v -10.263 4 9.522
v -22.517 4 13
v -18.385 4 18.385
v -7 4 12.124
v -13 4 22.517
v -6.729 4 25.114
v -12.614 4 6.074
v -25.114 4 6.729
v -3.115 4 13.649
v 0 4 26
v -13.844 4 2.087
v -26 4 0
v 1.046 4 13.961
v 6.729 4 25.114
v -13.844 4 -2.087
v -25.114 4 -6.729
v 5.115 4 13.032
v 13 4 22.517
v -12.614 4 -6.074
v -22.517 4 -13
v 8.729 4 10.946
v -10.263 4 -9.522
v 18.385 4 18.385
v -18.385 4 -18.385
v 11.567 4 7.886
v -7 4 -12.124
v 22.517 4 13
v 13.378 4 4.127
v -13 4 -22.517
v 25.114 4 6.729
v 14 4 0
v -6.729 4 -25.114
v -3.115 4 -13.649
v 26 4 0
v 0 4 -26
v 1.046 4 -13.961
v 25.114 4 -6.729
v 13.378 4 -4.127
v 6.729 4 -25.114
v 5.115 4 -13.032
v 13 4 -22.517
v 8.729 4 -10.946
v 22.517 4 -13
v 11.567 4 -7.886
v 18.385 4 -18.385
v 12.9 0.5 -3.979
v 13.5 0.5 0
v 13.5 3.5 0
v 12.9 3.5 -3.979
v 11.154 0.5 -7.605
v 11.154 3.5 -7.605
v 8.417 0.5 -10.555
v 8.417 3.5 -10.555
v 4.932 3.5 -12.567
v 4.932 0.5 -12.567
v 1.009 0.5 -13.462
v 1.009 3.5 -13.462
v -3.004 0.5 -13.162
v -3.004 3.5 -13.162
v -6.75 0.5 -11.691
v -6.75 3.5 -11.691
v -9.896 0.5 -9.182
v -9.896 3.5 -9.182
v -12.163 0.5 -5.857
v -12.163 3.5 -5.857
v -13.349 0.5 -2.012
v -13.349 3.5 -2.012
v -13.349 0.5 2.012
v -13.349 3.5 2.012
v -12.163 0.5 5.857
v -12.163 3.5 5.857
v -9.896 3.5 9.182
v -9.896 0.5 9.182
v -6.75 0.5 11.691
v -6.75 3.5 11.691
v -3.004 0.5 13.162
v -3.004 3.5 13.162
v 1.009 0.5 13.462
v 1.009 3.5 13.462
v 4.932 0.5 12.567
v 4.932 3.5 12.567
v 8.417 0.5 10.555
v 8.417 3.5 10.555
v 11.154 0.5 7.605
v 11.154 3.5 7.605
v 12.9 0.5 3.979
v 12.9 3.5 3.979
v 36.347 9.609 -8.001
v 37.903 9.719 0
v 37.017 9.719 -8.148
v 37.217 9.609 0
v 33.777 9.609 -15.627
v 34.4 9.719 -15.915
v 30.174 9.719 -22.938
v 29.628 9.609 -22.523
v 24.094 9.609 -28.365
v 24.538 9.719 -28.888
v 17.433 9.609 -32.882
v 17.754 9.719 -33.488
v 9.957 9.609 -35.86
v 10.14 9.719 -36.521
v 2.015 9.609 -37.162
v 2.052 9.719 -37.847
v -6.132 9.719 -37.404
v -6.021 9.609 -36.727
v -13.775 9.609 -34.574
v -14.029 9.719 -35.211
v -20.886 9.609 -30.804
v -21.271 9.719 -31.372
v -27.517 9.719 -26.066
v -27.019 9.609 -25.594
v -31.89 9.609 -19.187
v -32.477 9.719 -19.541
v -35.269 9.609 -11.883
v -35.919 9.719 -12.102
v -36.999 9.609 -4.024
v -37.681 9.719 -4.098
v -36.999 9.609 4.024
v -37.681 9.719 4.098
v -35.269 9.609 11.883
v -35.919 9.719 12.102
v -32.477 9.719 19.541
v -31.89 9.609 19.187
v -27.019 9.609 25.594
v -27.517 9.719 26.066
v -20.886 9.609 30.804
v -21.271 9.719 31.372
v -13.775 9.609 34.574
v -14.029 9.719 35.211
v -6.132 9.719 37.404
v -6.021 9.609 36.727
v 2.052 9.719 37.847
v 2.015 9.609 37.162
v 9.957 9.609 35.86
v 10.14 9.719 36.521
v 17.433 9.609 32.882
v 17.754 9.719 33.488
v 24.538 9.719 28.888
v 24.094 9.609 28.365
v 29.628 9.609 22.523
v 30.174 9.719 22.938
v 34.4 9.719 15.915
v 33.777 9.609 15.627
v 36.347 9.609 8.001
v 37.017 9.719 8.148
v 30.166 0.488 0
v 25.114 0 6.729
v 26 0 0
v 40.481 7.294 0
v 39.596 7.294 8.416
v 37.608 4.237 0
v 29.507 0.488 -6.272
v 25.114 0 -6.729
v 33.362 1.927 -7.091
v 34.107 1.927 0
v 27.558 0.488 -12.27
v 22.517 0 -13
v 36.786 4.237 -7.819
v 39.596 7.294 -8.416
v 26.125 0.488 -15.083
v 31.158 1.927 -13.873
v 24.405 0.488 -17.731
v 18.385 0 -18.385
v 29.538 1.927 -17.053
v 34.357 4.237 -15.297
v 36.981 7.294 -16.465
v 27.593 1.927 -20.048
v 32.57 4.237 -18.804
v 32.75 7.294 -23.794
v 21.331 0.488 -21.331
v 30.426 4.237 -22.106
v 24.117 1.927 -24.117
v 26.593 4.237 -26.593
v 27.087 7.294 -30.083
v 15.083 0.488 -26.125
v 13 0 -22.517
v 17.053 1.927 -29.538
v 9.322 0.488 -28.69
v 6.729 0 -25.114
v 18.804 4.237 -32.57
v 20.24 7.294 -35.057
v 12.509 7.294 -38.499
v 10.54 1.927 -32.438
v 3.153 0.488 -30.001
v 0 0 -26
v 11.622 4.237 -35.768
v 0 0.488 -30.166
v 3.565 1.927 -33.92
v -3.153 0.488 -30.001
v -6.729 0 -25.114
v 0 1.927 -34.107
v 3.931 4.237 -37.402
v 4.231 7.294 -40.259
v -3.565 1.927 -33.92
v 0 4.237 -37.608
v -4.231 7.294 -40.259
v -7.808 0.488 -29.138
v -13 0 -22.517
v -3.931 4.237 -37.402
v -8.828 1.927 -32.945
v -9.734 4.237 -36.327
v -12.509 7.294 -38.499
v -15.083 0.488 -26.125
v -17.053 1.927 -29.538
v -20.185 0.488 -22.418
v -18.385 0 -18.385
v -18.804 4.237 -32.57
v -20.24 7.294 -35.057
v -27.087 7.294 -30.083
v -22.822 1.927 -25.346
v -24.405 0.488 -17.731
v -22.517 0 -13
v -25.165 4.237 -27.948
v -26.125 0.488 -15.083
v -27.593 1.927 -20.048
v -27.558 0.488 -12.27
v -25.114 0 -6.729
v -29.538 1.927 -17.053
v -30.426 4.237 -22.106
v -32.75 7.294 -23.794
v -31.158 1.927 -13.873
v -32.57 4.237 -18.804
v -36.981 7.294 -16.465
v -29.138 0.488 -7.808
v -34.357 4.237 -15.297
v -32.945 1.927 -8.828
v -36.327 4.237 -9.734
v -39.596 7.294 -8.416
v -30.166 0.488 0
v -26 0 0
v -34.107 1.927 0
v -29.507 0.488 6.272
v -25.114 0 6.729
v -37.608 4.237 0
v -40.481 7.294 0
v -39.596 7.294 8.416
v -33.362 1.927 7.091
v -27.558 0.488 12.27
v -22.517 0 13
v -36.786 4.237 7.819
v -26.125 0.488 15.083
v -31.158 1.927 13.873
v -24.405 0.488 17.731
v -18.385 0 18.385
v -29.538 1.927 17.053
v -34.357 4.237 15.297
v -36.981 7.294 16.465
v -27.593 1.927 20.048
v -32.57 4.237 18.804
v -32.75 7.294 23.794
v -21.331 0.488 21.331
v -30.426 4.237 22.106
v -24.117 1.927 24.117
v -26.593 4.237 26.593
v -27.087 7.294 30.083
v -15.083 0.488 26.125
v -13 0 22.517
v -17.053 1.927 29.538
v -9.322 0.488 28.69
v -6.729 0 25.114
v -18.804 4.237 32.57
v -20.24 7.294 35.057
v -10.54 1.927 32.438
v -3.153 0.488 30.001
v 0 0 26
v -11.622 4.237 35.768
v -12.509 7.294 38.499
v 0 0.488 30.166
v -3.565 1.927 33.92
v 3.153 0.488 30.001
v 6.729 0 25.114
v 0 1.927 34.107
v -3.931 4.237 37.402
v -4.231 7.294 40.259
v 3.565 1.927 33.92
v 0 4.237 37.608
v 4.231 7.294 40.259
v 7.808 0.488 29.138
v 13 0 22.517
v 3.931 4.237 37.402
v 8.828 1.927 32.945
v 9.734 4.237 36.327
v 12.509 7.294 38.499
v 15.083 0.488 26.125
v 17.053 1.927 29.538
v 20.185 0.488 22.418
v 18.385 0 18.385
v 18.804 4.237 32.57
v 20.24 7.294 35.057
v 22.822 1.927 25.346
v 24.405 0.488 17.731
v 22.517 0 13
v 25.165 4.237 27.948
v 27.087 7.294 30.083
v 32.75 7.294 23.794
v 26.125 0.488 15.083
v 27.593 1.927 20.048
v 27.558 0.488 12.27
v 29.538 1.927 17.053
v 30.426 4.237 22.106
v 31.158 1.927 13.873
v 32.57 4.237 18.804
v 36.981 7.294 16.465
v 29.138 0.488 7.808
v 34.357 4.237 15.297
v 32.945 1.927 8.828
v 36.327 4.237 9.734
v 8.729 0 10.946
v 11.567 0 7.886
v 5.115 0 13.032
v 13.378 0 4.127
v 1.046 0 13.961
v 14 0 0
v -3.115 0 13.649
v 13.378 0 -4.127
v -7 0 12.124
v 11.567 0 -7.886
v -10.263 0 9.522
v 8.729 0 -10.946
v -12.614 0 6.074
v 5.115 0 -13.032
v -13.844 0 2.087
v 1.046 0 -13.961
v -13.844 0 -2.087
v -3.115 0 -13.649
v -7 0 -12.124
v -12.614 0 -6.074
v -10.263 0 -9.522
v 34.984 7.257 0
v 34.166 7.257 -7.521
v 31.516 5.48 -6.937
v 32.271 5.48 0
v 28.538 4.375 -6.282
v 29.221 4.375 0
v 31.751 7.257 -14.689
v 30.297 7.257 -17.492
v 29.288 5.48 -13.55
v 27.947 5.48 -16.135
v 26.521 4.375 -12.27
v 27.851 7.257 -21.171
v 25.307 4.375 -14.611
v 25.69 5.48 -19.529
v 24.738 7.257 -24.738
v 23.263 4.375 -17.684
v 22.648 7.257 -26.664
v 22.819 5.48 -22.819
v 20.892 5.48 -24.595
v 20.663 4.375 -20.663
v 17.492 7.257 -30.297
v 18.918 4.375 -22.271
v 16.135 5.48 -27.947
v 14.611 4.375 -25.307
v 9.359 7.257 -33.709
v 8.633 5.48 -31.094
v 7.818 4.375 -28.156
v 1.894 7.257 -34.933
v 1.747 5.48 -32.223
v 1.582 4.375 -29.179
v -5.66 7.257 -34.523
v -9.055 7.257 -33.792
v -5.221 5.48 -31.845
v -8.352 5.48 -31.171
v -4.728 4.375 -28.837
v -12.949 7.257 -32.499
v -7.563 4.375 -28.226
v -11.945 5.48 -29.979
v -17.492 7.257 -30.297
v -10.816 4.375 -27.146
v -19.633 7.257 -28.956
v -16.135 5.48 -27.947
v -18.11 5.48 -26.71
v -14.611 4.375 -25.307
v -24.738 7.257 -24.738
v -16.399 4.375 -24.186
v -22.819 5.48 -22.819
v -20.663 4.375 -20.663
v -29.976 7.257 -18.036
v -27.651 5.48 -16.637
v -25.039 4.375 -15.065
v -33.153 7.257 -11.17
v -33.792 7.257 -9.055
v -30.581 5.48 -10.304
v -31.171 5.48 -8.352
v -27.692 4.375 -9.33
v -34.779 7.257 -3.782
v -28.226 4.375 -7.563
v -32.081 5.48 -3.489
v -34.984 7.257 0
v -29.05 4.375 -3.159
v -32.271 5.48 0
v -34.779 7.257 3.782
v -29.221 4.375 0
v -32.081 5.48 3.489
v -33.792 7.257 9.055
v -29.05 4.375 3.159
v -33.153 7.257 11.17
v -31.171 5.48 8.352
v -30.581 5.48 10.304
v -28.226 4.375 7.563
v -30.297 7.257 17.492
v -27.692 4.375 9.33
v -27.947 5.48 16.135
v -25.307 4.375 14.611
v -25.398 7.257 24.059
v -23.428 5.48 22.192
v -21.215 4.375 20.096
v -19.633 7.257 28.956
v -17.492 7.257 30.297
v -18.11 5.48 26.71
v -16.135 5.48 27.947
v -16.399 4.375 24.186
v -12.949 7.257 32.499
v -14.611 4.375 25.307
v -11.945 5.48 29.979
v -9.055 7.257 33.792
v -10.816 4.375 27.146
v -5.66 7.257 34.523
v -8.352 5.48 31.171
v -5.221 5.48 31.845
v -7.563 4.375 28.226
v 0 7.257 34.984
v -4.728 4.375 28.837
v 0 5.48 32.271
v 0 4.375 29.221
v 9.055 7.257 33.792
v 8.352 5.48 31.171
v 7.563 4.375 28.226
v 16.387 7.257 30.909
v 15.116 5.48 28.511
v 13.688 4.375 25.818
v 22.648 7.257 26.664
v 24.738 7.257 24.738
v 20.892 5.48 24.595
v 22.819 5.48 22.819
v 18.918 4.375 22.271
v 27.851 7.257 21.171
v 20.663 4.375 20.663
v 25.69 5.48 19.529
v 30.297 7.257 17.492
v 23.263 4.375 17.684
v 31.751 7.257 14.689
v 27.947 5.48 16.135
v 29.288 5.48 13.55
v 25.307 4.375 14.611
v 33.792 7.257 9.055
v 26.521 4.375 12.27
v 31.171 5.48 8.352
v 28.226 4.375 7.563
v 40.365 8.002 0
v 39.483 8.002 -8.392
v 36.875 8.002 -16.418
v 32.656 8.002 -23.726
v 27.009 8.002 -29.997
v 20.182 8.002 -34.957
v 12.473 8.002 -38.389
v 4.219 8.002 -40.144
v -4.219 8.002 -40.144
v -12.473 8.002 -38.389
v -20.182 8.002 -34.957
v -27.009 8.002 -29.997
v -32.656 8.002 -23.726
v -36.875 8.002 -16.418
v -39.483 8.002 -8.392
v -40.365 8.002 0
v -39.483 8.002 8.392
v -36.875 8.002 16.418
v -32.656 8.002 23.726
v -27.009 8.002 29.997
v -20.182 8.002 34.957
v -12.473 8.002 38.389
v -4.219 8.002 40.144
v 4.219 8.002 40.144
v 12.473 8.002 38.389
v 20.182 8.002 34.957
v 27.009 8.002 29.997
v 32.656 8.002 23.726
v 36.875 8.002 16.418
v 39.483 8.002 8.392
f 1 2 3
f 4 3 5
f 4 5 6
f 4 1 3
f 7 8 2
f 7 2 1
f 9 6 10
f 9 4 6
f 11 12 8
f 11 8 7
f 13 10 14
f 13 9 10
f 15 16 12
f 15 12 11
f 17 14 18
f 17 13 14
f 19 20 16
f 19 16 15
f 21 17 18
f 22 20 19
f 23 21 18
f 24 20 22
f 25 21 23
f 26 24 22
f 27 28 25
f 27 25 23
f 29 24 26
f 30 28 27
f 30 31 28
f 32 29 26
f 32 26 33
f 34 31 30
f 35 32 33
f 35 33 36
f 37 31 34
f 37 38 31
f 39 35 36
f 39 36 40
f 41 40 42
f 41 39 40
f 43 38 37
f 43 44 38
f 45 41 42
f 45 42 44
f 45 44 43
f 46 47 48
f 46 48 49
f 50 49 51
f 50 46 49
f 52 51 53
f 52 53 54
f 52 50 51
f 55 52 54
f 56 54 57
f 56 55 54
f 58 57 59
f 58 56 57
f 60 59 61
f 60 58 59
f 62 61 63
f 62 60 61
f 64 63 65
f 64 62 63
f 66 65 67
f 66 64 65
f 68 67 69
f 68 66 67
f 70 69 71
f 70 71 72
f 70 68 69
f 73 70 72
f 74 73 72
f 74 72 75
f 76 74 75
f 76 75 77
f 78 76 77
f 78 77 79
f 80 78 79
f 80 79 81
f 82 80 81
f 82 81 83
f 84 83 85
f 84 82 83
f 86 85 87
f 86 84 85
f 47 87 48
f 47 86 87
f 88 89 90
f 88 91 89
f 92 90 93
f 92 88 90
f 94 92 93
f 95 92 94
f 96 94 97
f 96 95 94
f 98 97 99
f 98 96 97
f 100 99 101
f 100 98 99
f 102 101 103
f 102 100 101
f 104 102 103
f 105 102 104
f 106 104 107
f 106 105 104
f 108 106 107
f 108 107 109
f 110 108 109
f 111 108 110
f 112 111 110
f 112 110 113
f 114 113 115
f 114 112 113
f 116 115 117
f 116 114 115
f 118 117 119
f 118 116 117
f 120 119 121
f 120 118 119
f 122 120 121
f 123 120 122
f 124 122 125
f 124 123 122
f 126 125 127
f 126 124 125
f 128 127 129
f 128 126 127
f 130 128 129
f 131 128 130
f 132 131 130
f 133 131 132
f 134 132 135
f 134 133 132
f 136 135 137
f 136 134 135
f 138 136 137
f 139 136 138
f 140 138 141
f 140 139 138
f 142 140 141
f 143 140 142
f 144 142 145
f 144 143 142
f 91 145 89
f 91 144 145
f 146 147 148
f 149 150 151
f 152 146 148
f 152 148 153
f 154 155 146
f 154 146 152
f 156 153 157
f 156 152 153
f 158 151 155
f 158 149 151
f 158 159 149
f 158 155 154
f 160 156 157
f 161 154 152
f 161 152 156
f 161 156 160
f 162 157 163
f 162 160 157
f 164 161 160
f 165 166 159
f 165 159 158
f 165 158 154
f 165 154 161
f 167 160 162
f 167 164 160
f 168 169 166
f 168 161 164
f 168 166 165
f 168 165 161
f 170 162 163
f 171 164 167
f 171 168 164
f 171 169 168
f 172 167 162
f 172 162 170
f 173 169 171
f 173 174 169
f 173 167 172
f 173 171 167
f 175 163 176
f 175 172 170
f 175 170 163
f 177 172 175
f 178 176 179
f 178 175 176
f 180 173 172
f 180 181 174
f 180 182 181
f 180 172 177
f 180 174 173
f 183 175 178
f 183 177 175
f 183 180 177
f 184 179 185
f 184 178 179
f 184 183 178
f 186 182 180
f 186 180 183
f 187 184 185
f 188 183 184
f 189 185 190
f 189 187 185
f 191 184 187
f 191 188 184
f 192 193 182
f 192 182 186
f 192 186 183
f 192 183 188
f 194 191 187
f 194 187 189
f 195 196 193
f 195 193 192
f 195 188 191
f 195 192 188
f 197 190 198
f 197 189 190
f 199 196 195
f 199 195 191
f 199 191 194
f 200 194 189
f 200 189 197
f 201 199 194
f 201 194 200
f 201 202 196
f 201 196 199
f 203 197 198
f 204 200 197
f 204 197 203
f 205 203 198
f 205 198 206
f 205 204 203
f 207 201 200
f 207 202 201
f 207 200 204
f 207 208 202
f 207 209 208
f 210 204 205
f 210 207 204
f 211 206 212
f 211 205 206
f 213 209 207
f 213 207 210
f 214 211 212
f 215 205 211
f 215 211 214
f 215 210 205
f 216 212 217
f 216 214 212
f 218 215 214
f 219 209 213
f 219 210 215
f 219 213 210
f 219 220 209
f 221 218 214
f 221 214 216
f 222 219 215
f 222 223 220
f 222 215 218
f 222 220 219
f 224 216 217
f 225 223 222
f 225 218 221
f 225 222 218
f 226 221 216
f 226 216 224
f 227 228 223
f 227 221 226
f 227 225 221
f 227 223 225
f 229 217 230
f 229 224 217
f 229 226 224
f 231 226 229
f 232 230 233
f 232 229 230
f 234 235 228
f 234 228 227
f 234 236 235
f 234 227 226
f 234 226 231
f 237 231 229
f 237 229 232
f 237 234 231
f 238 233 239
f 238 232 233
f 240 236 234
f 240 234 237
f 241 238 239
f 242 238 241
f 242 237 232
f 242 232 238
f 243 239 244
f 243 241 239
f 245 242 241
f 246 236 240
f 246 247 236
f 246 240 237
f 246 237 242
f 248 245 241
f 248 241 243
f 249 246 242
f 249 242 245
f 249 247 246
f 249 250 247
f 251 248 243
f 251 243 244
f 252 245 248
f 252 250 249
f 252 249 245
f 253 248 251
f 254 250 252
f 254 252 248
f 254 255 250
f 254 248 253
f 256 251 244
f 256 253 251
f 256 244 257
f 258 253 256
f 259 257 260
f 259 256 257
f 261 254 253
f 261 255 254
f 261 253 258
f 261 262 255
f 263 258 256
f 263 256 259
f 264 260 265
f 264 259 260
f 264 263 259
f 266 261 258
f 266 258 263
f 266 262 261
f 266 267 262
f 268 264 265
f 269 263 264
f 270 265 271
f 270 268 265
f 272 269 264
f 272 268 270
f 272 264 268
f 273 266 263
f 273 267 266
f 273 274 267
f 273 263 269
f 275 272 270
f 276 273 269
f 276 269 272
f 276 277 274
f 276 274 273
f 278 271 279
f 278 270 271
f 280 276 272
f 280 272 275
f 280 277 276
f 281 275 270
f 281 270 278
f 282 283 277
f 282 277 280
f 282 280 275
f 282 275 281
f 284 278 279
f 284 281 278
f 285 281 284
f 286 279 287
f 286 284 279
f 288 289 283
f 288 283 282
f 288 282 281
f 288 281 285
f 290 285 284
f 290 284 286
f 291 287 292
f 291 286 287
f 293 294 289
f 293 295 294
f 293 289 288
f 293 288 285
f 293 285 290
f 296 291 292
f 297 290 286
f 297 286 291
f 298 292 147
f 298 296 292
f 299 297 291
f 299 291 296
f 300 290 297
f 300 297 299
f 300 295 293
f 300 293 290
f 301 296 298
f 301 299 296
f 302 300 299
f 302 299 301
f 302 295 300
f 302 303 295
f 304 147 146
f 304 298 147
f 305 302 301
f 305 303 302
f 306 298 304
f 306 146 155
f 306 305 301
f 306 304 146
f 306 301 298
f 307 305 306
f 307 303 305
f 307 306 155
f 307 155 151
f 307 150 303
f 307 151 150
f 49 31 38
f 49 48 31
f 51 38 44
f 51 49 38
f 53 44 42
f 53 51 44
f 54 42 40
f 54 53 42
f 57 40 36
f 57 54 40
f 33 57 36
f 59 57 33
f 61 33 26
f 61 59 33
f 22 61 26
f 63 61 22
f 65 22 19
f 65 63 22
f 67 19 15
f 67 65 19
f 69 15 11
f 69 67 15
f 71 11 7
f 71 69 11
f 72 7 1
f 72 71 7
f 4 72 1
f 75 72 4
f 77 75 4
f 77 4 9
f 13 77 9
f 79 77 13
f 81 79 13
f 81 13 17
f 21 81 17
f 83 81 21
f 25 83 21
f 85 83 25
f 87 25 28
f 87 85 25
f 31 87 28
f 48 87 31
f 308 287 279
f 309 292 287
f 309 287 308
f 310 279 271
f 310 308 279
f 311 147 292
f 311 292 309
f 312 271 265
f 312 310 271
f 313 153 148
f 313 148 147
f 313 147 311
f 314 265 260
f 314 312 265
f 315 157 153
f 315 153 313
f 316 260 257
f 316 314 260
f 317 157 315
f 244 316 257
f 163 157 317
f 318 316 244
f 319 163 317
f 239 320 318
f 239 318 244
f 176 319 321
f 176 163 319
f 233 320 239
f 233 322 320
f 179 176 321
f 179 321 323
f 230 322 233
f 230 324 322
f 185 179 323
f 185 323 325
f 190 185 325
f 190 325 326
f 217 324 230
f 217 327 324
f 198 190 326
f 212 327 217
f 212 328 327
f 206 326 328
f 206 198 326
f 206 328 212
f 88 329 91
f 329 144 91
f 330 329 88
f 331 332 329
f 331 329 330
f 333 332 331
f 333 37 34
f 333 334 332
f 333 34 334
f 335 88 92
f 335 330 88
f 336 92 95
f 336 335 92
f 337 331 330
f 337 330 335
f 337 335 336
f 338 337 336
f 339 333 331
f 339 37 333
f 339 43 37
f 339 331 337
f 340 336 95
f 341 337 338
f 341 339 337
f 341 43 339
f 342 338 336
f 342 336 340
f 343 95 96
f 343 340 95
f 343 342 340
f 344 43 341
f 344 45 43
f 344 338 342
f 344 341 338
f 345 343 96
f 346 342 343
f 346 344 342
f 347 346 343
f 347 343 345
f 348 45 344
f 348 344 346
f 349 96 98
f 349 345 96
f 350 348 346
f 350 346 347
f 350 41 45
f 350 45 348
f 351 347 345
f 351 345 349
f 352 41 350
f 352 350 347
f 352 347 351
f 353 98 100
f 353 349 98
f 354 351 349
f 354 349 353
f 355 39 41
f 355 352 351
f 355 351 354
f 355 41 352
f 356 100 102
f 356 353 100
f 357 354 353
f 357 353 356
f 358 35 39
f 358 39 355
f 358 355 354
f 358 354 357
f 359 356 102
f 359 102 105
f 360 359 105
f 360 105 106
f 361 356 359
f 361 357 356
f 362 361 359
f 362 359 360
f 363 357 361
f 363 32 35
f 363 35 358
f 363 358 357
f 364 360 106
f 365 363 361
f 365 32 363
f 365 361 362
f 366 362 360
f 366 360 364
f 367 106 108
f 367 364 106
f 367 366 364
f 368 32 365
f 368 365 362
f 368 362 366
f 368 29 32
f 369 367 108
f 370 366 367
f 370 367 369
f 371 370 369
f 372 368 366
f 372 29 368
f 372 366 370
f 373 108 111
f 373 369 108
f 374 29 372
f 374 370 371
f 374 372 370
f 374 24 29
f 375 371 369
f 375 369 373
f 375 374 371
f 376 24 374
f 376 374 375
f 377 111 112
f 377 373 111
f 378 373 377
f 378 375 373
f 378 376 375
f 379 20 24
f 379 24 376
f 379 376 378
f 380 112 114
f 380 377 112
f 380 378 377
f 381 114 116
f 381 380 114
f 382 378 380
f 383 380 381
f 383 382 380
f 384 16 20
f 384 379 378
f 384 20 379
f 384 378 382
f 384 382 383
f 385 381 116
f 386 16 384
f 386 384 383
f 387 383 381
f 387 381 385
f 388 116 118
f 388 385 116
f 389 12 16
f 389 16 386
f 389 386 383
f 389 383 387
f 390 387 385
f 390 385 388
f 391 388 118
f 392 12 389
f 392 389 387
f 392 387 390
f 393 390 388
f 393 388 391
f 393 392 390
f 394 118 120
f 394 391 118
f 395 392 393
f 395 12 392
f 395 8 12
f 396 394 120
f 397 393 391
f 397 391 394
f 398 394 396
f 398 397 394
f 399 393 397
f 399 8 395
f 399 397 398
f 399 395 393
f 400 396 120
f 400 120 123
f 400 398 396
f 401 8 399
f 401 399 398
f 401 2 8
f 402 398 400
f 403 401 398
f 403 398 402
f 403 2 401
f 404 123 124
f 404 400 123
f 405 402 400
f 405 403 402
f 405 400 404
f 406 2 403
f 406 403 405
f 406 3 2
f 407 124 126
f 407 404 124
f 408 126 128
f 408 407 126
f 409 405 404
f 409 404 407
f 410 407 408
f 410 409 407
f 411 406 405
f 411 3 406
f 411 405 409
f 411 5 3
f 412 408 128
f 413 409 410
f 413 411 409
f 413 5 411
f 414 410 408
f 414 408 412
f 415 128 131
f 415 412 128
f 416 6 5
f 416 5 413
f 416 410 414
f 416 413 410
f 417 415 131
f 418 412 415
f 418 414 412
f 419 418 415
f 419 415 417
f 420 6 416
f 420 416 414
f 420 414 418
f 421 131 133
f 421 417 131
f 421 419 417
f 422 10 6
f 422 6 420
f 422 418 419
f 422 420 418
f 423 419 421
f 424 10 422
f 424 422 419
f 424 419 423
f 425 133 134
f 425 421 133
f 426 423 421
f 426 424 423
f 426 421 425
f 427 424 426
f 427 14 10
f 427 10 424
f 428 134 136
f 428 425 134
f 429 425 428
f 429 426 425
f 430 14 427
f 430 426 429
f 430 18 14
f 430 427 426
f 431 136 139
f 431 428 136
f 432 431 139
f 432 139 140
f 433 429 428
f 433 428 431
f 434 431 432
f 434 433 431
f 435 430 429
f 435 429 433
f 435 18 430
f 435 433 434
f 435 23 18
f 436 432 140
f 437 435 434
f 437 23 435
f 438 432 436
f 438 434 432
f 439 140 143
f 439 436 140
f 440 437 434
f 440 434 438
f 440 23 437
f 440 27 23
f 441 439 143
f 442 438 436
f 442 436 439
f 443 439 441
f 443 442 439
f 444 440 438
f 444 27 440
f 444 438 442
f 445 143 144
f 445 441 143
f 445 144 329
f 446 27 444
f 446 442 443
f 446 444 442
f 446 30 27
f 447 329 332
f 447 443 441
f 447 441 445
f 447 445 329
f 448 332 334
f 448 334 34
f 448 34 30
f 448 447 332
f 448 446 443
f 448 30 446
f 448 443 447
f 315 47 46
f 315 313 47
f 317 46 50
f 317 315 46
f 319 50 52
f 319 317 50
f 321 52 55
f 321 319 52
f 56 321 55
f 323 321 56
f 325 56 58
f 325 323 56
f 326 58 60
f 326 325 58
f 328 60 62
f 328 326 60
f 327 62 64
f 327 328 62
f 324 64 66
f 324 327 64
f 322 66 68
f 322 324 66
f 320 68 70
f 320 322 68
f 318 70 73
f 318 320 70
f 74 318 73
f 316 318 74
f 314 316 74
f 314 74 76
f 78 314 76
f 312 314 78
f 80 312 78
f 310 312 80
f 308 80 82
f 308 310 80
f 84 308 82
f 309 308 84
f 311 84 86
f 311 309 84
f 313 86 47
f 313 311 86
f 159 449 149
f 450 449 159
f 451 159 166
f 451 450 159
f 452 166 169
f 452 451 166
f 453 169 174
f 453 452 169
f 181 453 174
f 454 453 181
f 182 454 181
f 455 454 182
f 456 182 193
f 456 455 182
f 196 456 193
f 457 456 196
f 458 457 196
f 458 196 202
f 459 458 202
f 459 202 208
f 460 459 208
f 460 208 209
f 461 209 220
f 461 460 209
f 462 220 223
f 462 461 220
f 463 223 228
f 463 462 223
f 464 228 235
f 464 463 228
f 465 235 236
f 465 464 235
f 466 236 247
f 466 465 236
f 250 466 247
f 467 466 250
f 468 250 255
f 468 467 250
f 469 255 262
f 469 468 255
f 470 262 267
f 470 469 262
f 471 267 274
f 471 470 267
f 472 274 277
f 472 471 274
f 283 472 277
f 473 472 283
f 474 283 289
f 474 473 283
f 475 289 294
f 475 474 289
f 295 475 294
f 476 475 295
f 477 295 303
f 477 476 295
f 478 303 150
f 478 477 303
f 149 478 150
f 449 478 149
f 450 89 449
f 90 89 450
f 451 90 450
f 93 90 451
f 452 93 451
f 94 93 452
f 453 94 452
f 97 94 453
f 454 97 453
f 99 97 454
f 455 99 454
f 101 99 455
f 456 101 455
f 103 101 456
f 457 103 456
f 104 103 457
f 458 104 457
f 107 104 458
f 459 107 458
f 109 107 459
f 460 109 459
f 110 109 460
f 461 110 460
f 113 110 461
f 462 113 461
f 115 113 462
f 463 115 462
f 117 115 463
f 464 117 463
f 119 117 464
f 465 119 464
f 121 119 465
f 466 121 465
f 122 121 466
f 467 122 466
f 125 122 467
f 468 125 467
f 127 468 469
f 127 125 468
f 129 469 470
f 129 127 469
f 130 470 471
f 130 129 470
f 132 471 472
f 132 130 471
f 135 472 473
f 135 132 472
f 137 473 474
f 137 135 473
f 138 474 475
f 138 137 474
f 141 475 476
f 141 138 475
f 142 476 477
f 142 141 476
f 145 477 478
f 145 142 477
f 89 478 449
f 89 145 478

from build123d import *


# Not quite as in the source:
# - a fillet or chamfer that OpenCascade refuses, or shapes differently, is made with other operations: its cross-section is extruded or revolved along the edge and cut away or added


with BuildPart() as f1:
    # F0 (on Top) → F1 (revolve)
    with BuildSketch(Plane.XY):
        with BuildLine():
            Line((26, 4), (13.5, 4))
            Line((13.5, 4), (13.5, 0))
            Line((13.5, 0), (26, 0))
            ThreePointArc((26, 0), (34.3358249123, 2.0438355847), (40.7808320951, 7.7117384844))
            Line((40.7808320951, 7.7117384844), (37.5, 10))
            ThreePointArc((37.5, 10), (32.4855608855, 5.5901749694), (26, 4))
        make_face()
    revolve(axis=Axis((0, 5.3547318093, 0), (0, 1, 0)))

    # F2: chamfer of 0.5 on 5 edges, made by hand

    # F2_s1 → F2_t2 (revolve, cut)
    with BuildSketch(Plane.XY):
        Polygon((14, 4), (13.5, 3.5), (13.5, 4), align=None)
    revolve(axis=Axis((0, 4, 0), (0, 1, 0)), mode=Mode.SUBTRACT)

    # F2_s3 → F2_t4 (revolve, cut)
    with BuildSketch(Plane.XY):
        Polygon((13.5, 0.5), (14, 0), (13.5, 0), align=None)
    revolve(axis=Axis((0, 0, 0), (0, 1, 0)), mode=Mode.SUBTRACT)

    # F2_s5 → F2_t6 (revolve, cut)
    with BuildSketch(Plane.XY):
        with BuildLine():
            Line((37.9030413035, 9.7188932937), (37.2169968397, 9.608773582))
            ThreePointArc((37.2169968397, 9.608773582), (37.3560341631, 9.7974365018), (37.5, 10))
            Line((37.5, 10), (37.9030413035, 9.7188932937))
        make_face()
    revolve(axis=Axis((0, 10, 0), (0, 1, 0)), mode=Mode.SUBTRACT)

    # F2_s7 → F2_t8 (revolve, cut)
    with BuildSketch(Plane.XY):
        with BuildLine():
            Line((40.4806168806, 7.2941297957), (40.3648752289, 8.0018533277))
            Line((40.3648752289, 8.0018533277), (40.7808320951, 7.7117384844))
            ThreePointArc((40.7808320951, 7.7117384844), (40.6280870104, 7.4961241001), (40.4806168806, 7.2941297957))
        make_face()
    revolve(axis=Axis((0, 7.7117384844, 0), (0, 1, 0)), mode=Mode.SUBTRACT)


solid = f1.part
